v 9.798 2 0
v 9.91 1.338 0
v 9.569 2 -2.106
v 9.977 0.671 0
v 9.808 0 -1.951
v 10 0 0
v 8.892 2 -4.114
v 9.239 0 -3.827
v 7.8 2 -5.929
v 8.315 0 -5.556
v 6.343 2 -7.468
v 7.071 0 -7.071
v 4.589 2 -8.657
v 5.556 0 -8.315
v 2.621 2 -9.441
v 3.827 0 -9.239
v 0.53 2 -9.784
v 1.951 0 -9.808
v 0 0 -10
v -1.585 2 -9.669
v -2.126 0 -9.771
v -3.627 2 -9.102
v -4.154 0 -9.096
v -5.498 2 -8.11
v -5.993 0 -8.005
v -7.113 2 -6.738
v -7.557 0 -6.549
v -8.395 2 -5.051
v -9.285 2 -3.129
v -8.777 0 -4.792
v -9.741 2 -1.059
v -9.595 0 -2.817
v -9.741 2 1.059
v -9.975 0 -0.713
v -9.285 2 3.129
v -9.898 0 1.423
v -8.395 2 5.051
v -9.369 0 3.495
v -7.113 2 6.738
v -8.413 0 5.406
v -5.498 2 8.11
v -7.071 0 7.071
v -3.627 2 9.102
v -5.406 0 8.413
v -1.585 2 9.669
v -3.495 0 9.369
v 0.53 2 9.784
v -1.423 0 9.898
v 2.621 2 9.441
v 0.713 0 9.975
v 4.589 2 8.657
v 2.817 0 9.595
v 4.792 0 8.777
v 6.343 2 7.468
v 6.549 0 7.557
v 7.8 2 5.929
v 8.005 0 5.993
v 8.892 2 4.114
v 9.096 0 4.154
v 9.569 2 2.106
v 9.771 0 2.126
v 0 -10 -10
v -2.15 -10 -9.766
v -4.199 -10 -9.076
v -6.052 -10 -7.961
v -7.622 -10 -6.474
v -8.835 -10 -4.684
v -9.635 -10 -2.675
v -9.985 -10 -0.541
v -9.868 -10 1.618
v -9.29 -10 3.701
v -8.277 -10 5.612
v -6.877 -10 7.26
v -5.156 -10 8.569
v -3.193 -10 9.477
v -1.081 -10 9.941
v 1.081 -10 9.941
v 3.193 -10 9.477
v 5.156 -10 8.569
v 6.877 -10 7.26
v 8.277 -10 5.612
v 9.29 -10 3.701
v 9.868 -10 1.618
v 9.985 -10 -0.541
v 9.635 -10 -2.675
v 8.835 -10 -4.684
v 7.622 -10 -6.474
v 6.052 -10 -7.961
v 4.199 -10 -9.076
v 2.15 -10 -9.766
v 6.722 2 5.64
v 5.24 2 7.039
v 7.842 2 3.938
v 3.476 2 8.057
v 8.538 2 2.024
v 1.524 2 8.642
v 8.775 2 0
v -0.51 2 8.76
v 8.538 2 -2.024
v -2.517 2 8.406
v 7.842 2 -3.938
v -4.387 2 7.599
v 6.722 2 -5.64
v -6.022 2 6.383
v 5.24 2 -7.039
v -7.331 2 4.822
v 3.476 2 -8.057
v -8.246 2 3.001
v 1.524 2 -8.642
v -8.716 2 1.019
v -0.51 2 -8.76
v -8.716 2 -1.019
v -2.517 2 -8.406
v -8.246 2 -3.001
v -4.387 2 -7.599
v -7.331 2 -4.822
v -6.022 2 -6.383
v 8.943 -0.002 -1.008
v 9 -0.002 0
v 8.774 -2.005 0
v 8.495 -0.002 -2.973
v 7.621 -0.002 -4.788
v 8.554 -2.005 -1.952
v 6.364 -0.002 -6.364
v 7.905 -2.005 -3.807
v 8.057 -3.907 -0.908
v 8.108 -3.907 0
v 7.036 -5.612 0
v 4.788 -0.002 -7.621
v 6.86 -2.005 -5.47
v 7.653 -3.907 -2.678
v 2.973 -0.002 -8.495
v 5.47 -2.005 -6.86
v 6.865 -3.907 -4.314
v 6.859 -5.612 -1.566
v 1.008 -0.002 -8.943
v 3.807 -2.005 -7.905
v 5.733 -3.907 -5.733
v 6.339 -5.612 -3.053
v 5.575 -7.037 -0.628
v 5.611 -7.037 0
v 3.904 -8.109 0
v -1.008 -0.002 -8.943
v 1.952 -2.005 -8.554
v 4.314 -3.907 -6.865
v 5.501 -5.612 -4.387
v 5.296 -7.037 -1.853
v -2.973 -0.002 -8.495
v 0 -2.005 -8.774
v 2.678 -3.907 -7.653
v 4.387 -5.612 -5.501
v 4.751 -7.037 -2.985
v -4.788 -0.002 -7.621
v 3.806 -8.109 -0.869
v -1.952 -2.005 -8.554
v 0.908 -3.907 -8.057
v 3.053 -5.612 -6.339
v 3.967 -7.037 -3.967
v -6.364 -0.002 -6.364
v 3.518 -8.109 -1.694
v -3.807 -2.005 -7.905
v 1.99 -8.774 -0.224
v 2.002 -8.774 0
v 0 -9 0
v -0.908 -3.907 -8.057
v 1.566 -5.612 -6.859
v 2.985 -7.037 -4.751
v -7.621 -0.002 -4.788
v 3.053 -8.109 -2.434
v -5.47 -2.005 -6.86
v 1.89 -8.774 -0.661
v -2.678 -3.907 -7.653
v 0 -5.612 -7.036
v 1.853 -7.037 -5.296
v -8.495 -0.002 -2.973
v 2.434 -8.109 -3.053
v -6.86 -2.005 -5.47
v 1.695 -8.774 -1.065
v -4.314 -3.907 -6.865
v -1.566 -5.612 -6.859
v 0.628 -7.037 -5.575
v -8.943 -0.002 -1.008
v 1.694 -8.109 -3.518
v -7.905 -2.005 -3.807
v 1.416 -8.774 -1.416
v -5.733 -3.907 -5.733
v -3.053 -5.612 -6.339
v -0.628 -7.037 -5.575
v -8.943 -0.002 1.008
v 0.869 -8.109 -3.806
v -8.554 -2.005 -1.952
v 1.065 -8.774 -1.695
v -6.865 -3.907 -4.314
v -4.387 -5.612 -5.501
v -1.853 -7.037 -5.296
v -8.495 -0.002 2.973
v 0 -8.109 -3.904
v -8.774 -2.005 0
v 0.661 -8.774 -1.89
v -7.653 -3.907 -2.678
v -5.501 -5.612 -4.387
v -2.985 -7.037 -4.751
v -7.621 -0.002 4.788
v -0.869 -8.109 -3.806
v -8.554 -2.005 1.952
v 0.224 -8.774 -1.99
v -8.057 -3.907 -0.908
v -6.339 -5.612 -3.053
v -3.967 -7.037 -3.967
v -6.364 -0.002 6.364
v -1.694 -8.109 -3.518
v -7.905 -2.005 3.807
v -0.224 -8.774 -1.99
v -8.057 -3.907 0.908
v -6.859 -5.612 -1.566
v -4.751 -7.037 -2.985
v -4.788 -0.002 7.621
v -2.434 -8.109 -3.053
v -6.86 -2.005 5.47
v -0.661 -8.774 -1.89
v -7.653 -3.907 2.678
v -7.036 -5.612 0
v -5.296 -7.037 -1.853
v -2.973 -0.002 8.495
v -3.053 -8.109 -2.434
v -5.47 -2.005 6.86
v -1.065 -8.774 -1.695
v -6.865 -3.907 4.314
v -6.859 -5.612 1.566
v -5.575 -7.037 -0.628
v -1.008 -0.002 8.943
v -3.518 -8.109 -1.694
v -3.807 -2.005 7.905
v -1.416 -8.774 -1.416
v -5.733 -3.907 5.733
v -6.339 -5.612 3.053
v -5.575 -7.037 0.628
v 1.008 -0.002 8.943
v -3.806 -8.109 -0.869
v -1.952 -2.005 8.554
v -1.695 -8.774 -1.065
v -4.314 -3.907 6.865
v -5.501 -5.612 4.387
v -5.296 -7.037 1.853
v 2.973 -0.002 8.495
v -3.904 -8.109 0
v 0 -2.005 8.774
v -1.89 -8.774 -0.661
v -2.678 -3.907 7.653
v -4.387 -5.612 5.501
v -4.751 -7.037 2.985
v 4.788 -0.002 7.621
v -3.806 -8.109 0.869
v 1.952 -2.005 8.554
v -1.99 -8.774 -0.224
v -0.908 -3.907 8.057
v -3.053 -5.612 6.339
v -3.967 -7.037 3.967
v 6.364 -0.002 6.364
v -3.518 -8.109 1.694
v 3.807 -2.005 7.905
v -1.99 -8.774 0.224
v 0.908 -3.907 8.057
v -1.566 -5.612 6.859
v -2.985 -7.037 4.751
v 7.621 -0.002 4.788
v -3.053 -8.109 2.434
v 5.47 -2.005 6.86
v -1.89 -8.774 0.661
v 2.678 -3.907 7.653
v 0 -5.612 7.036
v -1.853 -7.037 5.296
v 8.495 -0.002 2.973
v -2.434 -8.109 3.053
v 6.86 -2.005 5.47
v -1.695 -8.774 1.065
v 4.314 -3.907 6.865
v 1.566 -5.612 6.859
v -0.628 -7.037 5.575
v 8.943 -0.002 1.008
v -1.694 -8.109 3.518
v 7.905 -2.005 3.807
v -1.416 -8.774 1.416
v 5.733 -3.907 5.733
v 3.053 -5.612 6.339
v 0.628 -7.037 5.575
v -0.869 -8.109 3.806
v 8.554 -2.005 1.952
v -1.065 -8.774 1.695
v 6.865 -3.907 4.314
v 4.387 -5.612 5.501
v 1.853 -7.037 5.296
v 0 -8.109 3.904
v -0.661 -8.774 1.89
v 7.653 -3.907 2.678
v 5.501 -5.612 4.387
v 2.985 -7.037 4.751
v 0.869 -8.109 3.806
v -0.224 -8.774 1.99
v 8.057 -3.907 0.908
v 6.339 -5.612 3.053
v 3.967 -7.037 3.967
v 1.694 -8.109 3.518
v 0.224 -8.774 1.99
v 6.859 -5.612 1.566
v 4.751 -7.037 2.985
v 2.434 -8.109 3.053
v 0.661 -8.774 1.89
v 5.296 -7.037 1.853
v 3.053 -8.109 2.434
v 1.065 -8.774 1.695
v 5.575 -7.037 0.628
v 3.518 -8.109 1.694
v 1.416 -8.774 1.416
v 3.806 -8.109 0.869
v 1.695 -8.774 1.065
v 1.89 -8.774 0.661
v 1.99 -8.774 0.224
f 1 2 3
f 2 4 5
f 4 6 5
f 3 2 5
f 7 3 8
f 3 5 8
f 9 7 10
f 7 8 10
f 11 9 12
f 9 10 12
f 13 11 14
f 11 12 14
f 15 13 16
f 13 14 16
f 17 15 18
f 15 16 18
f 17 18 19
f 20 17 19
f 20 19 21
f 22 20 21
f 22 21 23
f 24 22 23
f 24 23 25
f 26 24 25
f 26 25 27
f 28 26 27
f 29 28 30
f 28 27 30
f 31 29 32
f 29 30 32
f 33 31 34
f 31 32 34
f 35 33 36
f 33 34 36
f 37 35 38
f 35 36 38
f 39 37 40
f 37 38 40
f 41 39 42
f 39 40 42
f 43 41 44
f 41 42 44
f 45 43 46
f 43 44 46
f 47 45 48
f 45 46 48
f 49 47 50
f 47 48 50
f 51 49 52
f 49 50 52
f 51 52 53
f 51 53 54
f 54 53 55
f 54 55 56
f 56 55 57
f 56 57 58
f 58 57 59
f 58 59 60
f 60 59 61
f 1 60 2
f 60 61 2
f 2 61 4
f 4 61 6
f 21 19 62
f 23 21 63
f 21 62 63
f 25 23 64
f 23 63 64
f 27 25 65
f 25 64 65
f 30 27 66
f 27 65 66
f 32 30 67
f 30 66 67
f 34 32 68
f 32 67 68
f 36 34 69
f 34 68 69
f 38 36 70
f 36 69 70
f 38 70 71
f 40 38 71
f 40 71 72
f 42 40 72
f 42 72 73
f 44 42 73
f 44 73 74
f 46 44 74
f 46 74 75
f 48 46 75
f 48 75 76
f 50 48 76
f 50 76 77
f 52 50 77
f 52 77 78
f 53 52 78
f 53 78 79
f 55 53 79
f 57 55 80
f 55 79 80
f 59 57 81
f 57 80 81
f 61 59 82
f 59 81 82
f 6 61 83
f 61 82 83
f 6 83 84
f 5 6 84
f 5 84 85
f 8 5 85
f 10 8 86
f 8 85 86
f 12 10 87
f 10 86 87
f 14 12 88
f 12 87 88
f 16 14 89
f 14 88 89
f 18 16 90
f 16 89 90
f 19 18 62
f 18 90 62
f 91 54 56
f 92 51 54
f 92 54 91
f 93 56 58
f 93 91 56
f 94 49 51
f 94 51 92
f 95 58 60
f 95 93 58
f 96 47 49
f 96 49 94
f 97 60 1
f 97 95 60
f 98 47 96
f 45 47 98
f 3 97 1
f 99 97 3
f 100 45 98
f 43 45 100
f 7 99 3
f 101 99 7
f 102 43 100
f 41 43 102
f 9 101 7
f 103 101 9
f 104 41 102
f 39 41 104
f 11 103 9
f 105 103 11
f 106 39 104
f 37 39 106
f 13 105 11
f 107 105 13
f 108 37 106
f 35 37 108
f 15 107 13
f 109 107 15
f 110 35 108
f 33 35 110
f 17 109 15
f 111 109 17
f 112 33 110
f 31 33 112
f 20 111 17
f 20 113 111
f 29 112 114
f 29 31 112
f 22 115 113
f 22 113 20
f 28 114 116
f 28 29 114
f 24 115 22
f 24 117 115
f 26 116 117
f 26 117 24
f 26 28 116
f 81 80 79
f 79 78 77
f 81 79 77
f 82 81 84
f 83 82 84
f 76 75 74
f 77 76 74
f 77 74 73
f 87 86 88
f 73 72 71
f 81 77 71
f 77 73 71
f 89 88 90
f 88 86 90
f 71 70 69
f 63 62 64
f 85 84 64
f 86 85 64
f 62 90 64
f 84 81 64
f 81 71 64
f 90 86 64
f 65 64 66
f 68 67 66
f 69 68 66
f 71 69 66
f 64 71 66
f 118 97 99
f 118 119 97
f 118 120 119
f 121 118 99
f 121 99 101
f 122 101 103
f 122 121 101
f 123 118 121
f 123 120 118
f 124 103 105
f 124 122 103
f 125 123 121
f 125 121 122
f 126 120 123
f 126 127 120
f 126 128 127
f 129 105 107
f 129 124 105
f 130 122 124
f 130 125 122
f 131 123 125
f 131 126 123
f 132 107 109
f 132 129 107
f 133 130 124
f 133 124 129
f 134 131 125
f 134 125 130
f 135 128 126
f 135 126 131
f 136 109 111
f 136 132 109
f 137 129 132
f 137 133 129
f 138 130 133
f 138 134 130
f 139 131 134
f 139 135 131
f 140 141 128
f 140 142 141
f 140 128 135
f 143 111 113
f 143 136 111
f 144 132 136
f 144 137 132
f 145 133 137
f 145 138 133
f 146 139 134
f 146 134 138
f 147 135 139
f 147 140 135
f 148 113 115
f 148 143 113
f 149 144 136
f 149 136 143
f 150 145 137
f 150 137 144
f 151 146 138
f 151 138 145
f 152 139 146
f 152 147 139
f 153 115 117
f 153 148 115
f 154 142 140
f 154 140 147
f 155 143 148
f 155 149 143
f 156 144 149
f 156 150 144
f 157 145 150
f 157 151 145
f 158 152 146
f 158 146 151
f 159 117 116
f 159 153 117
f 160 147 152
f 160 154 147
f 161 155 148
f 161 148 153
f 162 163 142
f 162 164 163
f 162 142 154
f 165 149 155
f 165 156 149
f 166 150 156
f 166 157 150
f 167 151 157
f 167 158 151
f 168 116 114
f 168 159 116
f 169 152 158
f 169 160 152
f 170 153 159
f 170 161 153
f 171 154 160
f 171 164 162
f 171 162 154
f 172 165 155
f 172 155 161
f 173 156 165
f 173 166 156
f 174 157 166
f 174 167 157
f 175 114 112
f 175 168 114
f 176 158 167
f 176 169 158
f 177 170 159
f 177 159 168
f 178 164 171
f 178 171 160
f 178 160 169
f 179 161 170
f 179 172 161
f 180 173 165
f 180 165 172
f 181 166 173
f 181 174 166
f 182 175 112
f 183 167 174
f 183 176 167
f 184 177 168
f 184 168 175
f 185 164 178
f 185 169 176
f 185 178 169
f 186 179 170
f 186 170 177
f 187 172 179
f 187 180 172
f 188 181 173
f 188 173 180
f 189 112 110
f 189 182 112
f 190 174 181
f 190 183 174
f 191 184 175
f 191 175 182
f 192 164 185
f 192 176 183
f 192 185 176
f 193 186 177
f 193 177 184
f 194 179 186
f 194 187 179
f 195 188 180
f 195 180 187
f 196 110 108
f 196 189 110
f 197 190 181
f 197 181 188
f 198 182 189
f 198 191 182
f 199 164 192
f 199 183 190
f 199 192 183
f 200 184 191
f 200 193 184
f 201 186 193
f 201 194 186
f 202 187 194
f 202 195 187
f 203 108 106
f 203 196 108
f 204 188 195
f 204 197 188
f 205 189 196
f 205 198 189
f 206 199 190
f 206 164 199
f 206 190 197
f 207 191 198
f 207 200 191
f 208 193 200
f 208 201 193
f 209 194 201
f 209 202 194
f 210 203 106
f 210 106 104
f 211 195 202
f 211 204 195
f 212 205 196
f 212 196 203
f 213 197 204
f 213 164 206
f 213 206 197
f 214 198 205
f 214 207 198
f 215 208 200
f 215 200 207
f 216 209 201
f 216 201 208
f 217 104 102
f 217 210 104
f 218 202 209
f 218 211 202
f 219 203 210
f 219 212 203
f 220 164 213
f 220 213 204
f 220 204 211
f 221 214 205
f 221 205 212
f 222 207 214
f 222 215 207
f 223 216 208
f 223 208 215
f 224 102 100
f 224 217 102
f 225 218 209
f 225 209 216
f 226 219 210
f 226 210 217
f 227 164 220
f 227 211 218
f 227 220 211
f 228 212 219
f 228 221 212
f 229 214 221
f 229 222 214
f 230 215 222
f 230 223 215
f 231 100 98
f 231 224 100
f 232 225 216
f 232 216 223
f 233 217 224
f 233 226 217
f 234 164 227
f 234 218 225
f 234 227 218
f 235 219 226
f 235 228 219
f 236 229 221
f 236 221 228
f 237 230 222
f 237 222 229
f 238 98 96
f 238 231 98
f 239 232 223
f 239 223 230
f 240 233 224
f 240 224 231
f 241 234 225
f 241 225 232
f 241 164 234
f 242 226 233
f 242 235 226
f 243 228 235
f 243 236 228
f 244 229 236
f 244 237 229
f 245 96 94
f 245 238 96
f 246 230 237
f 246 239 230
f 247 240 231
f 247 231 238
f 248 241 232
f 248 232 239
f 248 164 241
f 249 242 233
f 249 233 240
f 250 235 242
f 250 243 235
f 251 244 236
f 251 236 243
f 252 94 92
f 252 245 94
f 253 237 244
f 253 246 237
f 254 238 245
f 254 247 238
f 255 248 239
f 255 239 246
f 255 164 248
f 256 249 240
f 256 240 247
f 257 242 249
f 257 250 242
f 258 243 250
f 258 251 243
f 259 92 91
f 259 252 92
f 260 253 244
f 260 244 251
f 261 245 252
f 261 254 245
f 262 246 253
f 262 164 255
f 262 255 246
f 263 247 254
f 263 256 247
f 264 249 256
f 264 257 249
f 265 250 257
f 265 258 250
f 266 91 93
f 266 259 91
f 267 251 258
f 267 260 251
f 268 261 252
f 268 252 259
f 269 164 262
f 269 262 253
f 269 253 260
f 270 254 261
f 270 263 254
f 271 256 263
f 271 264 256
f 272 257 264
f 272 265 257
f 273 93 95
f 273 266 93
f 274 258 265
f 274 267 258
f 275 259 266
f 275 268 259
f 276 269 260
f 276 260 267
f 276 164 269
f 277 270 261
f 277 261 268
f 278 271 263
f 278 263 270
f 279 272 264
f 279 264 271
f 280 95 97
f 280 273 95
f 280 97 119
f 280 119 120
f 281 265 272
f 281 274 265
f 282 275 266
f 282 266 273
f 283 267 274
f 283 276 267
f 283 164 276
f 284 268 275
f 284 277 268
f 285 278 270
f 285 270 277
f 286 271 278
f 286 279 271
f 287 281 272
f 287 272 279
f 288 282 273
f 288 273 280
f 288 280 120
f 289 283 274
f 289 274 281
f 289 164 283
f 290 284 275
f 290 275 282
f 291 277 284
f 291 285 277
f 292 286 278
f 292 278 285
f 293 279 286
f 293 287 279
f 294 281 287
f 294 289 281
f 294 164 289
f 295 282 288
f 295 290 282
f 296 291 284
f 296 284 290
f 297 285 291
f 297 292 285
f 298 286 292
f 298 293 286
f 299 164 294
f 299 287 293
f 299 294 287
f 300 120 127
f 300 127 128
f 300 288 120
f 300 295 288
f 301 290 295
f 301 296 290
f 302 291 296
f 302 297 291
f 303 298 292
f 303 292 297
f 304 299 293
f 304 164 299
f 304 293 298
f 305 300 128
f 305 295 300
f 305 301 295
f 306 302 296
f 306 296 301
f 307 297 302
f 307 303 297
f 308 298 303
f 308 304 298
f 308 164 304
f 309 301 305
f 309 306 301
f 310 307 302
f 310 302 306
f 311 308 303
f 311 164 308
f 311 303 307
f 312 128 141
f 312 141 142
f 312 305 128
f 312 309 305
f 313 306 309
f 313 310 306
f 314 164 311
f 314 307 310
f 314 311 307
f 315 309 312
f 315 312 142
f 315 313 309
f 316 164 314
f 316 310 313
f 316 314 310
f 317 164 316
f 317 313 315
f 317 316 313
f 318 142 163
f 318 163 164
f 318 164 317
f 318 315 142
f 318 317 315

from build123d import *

# Parameters (mm, degrees)
CUT_EXTRUDE1_DEPTH       = 20
CUT_EXTRUDE1_DEPTH_BACK  = 20
SKETCH3_W                = 20
SKETCH3_H                = 10
SHELL1_T                 = -1
BOSS_EXTRUDE1_REACH      = 20.547
BOSS_EXTRUDE1_END_RADIUS = 10
SKETCH5_R                = 10


with BuildPart() as part:
    # Sketch2 → Revolve1 (revolve)
    with BuildSketch(Plane.XY):
        with BuildLine():
            Line((0, -10), (0, 10))
            ThreePointArc((0, 10), (10, 0), (0, -10))
        make_face()
    revolve(axis=Axis((0, -10, 0), (0, 1, 0)))

    # Sketch3 → Cut-Extrude1 (cut, two sides: drawn at the far end of the back side and taken through both)
    with BuildSketch(Plane(origin=(0, 0, 0), x_dir=(0, 0, -1), z_dir=(1, 0, 0)).offset(-CUT_EXTRUDE1_DEPTH_BACK)):
        with Locations((0, 7)):
            Rectangle(SKETCH3_W, SKETCH3_H)
    extrude(amount=CUT_EXTRUDE1_DEPTH + CUT_EXTRUDE1_DEPTH_BACK, mode=Mode.SUBTRACT)

    # Shell1
    shell1_openings = [part.faces().sort_by_distance(p)[0] for p in [
        (0, 2, 0),
    ]]
    offset(amount=SHELL1_T, openings=shell1_openings, kind=Kind.INTERSECTION)

    # Boss-Extrude1: up to this sphere (the profile starts outside it)
    boss_extrude1_end = Location((0, 0, 0)) * Sphere(BOSS_EXTRUDE1_END_RADIUS, mode=Mode.PRIVATE)
    # Sketch5 → Boss-Extrude1 (add, up to the surface)
    with BuildSketch(Plane(origin=(0, -10, 0), x_dir=(1, 0, 0), z_dir=(0, 1, 0)), mode=Mode.PRIVATE) as boss_extrude1_sk1:
        with Locations(Location((0, 0, 0), (0, 0, 90))):
            Circle(SKETCH5_R)
    boss_extrude1_tool1 = extrude(boss_extrude1_sk1.sketch, amount=BOSS_EXTRUDE1_REACH, mode=Mode.PRIVATE) - boss_extrude1_end
    add(boss_extrude1_tool1.solids().sort_by_distance((0, -10, 0))[0])


solid = part.part
